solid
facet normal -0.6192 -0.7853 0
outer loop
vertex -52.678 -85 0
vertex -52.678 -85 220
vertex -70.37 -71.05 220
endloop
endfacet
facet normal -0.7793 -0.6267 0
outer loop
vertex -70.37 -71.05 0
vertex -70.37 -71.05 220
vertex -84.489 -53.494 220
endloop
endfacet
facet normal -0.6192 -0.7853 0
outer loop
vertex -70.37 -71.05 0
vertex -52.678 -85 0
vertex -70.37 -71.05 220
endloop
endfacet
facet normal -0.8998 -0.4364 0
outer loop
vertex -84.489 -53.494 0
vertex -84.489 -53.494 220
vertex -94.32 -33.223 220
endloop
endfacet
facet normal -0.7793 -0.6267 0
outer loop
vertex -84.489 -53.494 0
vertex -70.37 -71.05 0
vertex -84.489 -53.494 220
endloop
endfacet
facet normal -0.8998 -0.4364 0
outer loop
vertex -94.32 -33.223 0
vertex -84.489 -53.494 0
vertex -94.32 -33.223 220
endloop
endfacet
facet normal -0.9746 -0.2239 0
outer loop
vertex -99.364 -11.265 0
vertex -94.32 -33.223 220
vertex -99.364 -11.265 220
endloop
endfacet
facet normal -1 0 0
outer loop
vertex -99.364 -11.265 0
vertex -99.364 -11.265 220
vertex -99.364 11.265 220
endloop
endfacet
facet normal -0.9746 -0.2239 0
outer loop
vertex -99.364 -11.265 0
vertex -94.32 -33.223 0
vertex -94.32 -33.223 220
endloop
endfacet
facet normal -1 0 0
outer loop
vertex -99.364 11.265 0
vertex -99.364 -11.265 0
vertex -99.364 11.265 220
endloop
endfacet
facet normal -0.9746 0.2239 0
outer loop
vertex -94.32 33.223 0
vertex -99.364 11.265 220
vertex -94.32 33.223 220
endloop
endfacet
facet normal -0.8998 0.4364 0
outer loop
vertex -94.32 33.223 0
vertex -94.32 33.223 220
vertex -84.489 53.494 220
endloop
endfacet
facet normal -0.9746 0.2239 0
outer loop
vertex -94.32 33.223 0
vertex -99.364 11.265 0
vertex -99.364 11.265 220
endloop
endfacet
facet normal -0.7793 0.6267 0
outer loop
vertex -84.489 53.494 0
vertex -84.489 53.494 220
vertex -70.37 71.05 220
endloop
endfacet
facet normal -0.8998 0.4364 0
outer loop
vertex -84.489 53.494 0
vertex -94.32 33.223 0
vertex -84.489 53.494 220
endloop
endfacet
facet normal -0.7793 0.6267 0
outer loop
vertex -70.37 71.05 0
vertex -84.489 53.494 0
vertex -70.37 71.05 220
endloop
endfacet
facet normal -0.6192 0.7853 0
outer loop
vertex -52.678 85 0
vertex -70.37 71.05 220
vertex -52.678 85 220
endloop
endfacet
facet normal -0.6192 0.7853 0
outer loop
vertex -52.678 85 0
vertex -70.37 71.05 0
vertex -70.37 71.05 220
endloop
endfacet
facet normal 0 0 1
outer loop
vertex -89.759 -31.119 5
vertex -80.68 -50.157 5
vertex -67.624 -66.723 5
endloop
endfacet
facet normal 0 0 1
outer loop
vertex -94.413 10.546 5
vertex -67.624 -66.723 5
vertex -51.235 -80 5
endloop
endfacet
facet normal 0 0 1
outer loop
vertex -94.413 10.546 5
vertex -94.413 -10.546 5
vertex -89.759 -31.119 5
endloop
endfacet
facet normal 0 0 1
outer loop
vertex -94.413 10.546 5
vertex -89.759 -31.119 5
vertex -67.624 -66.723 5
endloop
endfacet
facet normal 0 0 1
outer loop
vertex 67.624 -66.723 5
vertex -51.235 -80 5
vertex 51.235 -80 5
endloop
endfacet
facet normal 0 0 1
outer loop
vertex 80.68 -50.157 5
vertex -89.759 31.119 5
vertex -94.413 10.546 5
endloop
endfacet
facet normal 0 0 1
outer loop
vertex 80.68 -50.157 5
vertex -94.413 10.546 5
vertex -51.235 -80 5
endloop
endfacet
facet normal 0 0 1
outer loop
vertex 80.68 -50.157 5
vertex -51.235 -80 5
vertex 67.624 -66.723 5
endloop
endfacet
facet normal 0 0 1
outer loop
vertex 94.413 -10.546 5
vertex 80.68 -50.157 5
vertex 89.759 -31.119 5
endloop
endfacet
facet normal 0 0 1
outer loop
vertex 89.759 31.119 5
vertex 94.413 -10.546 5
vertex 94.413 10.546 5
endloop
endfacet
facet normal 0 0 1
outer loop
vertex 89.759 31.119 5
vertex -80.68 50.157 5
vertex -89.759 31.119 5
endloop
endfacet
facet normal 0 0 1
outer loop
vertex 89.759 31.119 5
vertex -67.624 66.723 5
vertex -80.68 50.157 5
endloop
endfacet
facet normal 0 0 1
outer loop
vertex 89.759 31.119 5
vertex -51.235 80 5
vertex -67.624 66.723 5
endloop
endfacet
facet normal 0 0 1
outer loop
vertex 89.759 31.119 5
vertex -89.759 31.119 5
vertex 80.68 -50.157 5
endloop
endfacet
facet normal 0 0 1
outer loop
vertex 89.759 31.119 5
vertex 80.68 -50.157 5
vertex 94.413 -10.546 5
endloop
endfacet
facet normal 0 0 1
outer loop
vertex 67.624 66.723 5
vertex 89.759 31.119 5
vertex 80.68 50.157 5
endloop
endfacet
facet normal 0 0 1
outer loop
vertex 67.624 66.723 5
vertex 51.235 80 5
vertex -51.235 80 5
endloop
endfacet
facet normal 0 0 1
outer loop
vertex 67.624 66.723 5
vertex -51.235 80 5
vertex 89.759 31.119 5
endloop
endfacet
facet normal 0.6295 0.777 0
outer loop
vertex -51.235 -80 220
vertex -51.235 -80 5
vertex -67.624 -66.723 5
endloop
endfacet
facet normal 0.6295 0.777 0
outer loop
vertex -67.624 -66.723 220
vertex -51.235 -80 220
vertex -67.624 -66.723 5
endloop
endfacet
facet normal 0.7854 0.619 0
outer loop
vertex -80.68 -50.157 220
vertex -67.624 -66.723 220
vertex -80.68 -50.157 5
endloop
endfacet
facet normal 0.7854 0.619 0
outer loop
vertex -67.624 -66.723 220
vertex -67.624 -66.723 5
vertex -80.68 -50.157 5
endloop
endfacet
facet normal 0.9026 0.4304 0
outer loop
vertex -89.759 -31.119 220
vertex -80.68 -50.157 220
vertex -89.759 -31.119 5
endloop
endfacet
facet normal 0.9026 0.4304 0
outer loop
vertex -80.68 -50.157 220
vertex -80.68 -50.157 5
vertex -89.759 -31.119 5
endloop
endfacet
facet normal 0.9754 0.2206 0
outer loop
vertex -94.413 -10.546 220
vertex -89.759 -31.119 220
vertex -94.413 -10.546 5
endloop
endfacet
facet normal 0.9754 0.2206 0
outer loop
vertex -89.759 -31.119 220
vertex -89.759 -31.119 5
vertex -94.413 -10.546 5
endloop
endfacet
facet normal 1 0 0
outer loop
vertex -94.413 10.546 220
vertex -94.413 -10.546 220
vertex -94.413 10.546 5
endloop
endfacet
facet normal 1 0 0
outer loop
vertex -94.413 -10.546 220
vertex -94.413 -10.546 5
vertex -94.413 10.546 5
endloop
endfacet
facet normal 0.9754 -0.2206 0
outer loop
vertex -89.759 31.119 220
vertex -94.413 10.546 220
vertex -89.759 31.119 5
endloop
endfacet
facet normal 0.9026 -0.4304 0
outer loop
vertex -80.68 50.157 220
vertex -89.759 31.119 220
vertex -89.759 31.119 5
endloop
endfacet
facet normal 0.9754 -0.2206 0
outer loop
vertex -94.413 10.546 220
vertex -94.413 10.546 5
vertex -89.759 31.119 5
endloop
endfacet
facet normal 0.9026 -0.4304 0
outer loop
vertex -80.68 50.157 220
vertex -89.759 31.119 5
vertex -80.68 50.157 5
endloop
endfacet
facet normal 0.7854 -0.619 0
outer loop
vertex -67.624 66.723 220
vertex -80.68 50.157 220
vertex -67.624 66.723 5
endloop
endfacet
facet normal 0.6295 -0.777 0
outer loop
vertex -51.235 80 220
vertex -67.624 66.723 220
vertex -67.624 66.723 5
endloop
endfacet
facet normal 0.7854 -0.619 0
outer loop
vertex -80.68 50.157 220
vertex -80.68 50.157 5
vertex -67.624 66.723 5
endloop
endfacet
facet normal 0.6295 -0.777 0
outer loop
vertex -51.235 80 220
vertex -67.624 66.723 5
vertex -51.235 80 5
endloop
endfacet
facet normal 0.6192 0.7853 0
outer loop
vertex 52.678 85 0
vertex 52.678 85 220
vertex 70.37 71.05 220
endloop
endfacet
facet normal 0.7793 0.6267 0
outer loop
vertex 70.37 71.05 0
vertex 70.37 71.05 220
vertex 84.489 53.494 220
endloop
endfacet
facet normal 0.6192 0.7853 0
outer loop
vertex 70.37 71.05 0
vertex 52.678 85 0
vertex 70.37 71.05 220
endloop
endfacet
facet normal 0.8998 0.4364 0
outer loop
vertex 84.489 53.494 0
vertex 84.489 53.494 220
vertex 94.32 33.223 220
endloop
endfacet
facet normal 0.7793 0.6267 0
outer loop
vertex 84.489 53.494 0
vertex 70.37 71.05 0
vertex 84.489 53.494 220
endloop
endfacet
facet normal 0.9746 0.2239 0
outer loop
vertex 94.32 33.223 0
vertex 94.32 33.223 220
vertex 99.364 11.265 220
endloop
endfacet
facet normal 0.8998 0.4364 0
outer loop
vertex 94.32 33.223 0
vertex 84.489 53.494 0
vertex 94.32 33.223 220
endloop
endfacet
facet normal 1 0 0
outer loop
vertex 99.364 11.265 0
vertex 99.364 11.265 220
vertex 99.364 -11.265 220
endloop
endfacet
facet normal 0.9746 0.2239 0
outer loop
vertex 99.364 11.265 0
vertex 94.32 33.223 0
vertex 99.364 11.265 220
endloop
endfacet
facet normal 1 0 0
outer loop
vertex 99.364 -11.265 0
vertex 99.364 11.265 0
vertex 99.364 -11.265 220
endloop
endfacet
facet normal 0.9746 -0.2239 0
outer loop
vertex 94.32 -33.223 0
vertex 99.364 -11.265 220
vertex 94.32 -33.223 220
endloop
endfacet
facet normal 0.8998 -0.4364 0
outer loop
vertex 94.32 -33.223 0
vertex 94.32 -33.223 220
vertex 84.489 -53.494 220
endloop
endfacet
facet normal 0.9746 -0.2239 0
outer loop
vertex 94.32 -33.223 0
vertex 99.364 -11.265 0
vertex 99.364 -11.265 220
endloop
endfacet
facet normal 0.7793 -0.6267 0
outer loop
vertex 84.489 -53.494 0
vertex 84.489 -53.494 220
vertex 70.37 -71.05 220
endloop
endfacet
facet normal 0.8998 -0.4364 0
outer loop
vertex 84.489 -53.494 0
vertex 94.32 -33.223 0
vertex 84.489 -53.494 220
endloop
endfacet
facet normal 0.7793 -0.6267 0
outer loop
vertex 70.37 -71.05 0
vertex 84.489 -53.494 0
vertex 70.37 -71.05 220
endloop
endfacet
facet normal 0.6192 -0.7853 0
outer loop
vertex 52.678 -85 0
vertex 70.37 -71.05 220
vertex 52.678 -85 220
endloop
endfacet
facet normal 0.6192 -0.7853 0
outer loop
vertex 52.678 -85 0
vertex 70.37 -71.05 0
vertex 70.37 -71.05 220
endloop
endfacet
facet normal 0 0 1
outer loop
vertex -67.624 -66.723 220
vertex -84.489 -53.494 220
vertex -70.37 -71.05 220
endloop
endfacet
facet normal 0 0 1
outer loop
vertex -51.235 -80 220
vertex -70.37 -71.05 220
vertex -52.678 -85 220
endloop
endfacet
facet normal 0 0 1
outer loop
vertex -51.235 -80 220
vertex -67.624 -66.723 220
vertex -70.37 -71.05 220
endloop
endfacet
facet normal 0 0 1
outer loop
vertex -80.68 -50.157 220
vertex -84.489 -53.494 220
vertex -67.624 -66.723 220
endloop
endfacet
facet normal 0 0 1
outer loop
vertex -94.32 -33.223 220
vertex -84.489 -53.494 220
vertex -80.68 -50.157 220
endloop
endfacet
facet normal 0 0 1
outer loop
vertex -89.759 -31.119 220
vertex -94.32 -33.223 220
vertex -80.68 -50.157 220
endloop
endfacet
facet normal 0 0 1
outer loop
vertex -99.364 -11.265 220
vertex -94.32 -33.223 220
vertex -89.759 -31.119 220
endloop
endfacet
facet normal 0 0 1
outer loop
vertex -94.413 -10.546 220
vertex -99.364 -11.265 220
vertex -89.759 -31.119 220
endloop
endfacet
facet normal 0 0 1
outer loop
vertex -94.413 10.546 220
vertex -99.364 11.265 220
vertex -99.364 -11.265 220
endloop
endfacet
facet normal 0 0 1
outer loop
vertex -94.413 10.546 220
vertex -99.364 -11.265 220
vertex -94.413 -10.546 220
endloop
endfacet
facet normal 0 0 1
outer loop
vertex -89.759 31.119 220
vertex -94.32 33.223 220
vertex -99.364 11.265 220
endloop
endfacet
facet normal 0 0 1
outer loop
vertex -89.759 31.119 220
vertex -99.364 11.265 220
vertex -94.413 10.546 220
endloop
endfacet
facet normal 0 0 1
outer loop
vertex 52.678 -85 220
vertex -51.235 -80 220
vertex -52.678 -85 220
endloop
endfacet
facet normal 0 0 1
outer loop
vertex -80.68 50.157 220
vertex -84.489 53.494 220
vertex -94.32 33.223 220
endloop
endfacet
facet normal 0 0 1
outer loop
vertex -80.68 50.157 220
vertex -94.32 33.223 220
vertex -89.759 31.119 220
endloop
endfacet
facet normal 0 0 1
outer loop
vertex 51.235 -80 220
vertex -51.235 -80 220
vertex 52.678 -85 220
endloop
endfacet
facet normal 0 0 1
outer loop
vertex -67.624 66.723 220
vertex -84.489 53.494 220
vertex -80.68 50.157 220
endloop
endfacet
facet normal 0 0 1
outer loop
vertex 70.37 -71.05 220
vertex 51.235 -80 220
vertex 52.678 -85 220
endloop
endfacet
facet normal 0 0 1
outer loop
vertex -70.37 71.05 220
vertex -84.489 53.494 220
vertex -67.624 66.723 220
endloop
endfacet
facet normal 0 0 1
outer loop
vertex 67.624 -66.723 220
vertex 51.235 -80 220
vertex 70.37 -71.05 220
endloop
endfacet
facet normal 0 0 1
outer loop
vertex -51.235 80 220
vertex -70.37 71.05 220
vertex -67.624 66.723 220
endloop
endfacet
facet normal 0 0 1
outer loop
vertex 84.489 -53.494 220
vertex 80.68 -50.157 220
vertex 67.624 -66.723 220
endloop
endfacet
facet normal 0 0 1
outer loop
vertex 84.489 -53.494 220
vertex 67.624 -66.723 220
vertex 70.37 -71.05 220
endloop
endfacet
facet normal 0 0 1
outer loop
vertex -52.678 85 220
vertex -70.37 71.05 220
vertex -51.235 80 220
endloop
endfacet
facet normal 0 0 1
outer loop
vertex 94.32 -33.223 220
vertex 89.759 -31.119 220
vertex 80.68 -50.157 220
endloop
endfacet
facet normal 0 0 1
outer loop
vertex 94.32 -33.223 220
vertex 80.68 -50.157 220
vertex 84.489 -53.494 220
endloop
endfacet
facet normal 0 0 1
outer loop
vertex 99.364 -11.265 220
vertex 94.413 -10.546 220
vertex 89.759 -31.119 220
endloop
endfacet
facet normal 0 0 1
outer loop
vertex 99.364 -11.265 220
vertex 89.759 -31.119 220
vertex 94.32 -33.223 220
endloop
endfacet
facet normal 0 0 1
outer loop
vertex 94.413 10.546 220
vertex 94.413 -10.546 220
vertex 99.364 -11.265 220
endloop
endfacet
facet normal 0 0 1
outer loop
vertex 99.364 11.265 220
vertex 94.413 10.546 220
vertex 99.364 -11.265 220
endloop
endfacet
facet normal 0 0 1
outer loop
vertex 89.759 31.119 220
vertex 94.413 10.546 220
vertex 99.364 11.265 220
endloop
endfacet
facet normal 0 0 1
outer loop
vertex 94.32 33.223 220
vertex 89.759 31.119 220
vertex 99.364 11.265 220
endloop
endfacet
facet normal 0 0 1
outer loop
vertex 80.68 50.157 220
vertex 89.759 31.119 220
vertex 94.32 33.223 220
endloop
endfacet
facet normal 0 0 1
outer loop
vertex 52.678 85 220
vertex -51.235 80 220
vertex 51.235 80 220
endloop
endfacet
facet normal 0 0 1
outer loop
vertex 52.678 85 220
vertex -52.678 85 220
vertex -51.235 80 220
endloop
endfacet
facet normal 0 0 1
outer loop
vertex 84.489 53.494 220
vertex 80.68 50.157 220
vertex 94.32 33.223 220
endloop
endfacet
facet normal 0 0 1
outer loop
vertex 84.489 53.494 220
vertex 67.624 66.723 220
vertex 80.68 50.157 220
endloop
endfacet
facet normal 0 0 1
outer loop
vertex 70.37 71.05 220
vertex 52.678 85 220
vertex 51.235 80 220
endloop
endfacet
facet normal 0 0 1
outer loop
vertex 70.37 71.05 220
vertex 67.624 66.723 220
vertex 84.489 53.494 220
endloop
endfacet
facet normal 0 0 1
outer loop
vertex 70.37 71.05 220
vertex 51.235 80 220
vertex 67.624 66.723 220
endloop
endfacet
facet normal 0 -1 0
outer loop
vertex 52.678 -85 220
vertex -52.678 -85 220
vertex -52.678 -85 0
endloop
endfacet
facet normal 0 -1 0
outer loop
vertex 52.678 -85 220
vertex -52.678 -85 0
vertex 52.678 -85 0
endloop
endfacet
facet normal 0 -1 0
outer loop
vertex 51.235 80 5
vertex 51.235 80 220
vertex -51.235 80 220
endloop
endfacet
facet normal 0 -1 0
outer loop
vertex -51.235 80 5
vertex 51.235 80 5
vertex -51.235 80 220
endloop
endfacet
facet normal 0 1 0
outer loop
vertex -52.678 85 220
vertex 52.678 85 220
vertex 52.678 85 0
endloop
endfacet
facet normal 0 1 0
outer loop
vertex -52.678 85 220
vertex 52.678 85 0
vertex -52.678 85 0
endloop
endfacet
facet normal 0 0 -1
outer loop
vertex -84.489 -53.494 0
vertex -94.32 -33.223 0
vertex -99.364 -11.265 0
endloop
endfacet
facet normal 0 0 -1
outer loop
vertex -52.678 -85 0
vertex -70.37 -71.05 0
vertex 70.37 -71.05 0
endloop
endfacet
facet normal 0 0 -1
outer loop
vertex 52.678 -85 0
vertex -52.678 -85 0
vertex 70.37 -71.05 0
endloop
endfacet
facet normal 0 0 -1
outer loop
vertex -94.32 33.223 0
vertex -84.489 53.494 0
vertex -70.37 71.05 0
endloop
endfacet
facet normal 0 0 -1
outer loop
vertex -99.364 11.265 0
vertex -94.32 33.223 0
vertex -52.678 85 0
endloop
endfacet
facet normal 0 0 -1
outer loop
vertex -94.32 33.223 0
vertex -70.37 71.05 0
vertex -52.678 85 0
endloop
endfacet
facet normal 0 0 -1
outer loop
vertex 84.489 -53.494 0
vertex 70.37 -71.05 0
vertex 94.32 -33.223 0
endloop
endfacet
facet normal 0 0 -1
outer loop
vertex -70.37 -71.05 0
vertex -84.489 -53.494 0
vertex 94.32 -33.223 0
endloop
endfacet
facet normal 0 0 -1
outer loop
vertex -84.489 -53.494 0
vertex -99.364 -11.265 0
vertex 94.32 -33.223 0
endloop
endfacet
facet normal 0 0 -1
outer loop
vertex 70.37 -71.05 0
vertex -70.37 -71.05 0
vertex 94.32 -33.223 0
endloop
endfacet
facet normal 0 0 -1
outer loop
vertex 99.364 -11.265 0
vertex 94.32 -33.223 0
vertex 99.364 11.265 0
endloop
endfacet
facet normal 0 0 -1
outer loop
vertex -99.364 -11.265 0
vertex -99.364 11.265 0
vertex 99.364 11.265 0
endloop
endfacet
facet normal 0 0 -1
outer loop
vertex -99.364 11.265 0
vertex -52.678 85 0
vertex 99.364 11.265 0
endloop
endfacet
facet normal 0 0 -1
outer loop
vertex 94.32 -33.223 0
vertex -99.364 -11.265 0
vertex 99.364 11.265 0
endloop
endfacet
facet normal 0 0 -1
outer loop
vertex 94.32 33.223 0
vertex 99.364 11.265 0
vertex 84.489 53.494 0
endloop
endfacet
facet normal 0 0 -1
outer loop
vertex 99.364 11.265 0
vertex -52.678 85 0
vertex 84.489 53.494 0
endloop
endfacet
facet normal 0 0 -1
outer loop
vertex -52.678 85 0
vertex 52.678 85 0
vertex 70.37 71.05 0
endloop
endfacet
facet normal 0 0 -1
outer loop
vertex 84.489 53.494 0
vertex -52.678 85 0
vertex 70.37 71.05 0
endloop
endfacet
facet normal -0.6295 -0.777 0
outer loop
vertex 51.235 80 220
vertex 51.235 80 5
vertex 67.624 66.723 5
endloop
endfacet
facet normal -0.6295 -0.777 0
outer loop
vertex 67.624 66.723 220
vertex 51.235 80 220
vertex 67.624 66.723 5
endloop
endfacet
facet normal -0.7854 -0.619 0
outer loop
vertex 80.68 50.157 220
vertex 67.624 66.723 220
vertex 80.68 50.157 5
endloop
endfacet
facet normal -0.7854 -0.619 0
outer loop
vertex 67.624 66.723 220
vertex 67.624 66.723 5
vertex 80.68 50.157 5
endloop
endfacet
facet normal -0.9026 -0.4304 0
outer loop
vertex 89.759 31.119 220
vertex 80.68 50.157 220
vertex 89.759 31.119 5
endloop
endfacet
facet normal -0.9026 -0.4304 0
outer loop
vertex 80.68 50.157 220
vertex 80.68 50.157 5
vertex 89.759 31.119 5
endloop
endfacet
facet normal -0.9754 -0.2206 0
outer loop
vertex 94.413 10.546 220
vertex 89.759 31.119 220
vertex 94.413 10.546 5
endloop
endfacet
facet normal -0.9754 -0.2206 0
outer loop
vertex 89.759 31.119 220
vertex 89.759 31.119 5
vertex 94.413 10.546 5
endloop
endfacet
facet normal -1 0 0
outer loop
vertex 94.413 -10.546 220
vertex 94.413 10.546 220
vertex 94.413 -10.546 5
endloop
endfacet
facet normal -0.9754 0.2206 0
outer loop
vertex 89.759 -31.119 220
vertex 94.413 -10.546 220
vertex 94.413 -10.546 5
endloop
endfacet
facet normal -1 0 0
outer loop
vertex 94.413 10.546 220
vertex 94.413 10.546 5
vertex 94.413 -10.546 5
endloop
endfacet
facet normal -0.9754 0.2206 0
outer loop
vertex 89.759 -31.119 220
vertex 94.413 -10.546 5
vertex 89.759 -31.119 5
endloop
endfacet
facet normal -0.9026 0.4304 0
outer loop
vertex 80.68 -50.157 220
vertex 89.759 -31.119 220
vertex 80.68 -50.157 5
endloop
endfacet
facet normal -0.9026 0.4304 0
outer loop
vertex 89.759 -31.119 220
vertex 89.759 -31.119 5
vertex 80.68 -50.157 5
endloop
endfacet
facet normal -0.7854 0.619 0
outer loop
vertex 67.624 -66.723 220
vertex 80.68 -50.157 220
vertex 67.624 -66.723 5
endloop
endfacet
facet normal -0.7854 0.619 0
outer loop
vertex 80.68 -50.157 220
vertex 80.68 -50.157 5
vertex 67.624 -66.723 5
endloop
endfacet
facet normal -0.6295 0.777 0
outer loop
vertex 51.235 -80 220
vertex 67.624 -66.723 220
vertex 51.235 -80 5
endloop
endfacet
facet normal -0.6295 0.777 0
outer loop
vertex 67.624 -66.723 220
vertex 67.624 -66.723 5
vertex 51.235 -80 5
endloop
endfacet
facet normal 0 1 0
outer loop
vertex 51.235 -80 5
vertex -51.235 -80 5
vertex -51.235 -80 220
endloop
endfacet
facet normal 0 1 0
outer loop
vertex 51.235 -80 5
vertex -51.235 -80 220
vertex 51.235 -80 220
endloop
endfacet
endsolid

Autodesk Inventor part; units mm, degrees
ref_plane "YZ Plane" through (0, 0, 0) normal (1, 0, 0) x (0, 1, 0)
ref_plane "XZ Plane" through (0, 0, 0) normal (0, 1, 0) x (-1, 0, 0)
ref_plane "XY Plane" through (0, 0, 0) normal (0, 0, 1) x (1, 0, 0)
sketch "Sketch1" plane through (0, 0, 0) normal (0, 0, 1) x (1, 0, 0)
  circle A0 centre (0, 0) radius 100
  dimension "d0" = 200
extrude "Extrusion1" add sketch "Sketch1" along normal blind 220
sketch "Sketch3" plane through (0, 0, 220) normal (0, 0, 1) x (1, 0, 0)
  line L0 (0, 0) -> (0, 85) construction
  circle A0 centre (0, 0) radius 100 projected
  arc A1 (52.6783, 85) -> (-52.6783, 85) centre (0, 0) ccw
  line L1 (52.6783, 85) -> (-52.6783, 85)
  dimension "d4" = 85
extrude "Extrusion2" cut sketch "Sketch3" against normal up to surface (220 mm away) contours L1 A0 picked at (-13.4735, 87.1556)
mirror "Mirror1" about plane through (0, 0, 0) normal (0, 1, 0) of "Extrusion2"
shell "Shell1" thickness 5 removed faces 1 at (-13.8939, 25.7023, 220)
properties part number "alternate brain box"
